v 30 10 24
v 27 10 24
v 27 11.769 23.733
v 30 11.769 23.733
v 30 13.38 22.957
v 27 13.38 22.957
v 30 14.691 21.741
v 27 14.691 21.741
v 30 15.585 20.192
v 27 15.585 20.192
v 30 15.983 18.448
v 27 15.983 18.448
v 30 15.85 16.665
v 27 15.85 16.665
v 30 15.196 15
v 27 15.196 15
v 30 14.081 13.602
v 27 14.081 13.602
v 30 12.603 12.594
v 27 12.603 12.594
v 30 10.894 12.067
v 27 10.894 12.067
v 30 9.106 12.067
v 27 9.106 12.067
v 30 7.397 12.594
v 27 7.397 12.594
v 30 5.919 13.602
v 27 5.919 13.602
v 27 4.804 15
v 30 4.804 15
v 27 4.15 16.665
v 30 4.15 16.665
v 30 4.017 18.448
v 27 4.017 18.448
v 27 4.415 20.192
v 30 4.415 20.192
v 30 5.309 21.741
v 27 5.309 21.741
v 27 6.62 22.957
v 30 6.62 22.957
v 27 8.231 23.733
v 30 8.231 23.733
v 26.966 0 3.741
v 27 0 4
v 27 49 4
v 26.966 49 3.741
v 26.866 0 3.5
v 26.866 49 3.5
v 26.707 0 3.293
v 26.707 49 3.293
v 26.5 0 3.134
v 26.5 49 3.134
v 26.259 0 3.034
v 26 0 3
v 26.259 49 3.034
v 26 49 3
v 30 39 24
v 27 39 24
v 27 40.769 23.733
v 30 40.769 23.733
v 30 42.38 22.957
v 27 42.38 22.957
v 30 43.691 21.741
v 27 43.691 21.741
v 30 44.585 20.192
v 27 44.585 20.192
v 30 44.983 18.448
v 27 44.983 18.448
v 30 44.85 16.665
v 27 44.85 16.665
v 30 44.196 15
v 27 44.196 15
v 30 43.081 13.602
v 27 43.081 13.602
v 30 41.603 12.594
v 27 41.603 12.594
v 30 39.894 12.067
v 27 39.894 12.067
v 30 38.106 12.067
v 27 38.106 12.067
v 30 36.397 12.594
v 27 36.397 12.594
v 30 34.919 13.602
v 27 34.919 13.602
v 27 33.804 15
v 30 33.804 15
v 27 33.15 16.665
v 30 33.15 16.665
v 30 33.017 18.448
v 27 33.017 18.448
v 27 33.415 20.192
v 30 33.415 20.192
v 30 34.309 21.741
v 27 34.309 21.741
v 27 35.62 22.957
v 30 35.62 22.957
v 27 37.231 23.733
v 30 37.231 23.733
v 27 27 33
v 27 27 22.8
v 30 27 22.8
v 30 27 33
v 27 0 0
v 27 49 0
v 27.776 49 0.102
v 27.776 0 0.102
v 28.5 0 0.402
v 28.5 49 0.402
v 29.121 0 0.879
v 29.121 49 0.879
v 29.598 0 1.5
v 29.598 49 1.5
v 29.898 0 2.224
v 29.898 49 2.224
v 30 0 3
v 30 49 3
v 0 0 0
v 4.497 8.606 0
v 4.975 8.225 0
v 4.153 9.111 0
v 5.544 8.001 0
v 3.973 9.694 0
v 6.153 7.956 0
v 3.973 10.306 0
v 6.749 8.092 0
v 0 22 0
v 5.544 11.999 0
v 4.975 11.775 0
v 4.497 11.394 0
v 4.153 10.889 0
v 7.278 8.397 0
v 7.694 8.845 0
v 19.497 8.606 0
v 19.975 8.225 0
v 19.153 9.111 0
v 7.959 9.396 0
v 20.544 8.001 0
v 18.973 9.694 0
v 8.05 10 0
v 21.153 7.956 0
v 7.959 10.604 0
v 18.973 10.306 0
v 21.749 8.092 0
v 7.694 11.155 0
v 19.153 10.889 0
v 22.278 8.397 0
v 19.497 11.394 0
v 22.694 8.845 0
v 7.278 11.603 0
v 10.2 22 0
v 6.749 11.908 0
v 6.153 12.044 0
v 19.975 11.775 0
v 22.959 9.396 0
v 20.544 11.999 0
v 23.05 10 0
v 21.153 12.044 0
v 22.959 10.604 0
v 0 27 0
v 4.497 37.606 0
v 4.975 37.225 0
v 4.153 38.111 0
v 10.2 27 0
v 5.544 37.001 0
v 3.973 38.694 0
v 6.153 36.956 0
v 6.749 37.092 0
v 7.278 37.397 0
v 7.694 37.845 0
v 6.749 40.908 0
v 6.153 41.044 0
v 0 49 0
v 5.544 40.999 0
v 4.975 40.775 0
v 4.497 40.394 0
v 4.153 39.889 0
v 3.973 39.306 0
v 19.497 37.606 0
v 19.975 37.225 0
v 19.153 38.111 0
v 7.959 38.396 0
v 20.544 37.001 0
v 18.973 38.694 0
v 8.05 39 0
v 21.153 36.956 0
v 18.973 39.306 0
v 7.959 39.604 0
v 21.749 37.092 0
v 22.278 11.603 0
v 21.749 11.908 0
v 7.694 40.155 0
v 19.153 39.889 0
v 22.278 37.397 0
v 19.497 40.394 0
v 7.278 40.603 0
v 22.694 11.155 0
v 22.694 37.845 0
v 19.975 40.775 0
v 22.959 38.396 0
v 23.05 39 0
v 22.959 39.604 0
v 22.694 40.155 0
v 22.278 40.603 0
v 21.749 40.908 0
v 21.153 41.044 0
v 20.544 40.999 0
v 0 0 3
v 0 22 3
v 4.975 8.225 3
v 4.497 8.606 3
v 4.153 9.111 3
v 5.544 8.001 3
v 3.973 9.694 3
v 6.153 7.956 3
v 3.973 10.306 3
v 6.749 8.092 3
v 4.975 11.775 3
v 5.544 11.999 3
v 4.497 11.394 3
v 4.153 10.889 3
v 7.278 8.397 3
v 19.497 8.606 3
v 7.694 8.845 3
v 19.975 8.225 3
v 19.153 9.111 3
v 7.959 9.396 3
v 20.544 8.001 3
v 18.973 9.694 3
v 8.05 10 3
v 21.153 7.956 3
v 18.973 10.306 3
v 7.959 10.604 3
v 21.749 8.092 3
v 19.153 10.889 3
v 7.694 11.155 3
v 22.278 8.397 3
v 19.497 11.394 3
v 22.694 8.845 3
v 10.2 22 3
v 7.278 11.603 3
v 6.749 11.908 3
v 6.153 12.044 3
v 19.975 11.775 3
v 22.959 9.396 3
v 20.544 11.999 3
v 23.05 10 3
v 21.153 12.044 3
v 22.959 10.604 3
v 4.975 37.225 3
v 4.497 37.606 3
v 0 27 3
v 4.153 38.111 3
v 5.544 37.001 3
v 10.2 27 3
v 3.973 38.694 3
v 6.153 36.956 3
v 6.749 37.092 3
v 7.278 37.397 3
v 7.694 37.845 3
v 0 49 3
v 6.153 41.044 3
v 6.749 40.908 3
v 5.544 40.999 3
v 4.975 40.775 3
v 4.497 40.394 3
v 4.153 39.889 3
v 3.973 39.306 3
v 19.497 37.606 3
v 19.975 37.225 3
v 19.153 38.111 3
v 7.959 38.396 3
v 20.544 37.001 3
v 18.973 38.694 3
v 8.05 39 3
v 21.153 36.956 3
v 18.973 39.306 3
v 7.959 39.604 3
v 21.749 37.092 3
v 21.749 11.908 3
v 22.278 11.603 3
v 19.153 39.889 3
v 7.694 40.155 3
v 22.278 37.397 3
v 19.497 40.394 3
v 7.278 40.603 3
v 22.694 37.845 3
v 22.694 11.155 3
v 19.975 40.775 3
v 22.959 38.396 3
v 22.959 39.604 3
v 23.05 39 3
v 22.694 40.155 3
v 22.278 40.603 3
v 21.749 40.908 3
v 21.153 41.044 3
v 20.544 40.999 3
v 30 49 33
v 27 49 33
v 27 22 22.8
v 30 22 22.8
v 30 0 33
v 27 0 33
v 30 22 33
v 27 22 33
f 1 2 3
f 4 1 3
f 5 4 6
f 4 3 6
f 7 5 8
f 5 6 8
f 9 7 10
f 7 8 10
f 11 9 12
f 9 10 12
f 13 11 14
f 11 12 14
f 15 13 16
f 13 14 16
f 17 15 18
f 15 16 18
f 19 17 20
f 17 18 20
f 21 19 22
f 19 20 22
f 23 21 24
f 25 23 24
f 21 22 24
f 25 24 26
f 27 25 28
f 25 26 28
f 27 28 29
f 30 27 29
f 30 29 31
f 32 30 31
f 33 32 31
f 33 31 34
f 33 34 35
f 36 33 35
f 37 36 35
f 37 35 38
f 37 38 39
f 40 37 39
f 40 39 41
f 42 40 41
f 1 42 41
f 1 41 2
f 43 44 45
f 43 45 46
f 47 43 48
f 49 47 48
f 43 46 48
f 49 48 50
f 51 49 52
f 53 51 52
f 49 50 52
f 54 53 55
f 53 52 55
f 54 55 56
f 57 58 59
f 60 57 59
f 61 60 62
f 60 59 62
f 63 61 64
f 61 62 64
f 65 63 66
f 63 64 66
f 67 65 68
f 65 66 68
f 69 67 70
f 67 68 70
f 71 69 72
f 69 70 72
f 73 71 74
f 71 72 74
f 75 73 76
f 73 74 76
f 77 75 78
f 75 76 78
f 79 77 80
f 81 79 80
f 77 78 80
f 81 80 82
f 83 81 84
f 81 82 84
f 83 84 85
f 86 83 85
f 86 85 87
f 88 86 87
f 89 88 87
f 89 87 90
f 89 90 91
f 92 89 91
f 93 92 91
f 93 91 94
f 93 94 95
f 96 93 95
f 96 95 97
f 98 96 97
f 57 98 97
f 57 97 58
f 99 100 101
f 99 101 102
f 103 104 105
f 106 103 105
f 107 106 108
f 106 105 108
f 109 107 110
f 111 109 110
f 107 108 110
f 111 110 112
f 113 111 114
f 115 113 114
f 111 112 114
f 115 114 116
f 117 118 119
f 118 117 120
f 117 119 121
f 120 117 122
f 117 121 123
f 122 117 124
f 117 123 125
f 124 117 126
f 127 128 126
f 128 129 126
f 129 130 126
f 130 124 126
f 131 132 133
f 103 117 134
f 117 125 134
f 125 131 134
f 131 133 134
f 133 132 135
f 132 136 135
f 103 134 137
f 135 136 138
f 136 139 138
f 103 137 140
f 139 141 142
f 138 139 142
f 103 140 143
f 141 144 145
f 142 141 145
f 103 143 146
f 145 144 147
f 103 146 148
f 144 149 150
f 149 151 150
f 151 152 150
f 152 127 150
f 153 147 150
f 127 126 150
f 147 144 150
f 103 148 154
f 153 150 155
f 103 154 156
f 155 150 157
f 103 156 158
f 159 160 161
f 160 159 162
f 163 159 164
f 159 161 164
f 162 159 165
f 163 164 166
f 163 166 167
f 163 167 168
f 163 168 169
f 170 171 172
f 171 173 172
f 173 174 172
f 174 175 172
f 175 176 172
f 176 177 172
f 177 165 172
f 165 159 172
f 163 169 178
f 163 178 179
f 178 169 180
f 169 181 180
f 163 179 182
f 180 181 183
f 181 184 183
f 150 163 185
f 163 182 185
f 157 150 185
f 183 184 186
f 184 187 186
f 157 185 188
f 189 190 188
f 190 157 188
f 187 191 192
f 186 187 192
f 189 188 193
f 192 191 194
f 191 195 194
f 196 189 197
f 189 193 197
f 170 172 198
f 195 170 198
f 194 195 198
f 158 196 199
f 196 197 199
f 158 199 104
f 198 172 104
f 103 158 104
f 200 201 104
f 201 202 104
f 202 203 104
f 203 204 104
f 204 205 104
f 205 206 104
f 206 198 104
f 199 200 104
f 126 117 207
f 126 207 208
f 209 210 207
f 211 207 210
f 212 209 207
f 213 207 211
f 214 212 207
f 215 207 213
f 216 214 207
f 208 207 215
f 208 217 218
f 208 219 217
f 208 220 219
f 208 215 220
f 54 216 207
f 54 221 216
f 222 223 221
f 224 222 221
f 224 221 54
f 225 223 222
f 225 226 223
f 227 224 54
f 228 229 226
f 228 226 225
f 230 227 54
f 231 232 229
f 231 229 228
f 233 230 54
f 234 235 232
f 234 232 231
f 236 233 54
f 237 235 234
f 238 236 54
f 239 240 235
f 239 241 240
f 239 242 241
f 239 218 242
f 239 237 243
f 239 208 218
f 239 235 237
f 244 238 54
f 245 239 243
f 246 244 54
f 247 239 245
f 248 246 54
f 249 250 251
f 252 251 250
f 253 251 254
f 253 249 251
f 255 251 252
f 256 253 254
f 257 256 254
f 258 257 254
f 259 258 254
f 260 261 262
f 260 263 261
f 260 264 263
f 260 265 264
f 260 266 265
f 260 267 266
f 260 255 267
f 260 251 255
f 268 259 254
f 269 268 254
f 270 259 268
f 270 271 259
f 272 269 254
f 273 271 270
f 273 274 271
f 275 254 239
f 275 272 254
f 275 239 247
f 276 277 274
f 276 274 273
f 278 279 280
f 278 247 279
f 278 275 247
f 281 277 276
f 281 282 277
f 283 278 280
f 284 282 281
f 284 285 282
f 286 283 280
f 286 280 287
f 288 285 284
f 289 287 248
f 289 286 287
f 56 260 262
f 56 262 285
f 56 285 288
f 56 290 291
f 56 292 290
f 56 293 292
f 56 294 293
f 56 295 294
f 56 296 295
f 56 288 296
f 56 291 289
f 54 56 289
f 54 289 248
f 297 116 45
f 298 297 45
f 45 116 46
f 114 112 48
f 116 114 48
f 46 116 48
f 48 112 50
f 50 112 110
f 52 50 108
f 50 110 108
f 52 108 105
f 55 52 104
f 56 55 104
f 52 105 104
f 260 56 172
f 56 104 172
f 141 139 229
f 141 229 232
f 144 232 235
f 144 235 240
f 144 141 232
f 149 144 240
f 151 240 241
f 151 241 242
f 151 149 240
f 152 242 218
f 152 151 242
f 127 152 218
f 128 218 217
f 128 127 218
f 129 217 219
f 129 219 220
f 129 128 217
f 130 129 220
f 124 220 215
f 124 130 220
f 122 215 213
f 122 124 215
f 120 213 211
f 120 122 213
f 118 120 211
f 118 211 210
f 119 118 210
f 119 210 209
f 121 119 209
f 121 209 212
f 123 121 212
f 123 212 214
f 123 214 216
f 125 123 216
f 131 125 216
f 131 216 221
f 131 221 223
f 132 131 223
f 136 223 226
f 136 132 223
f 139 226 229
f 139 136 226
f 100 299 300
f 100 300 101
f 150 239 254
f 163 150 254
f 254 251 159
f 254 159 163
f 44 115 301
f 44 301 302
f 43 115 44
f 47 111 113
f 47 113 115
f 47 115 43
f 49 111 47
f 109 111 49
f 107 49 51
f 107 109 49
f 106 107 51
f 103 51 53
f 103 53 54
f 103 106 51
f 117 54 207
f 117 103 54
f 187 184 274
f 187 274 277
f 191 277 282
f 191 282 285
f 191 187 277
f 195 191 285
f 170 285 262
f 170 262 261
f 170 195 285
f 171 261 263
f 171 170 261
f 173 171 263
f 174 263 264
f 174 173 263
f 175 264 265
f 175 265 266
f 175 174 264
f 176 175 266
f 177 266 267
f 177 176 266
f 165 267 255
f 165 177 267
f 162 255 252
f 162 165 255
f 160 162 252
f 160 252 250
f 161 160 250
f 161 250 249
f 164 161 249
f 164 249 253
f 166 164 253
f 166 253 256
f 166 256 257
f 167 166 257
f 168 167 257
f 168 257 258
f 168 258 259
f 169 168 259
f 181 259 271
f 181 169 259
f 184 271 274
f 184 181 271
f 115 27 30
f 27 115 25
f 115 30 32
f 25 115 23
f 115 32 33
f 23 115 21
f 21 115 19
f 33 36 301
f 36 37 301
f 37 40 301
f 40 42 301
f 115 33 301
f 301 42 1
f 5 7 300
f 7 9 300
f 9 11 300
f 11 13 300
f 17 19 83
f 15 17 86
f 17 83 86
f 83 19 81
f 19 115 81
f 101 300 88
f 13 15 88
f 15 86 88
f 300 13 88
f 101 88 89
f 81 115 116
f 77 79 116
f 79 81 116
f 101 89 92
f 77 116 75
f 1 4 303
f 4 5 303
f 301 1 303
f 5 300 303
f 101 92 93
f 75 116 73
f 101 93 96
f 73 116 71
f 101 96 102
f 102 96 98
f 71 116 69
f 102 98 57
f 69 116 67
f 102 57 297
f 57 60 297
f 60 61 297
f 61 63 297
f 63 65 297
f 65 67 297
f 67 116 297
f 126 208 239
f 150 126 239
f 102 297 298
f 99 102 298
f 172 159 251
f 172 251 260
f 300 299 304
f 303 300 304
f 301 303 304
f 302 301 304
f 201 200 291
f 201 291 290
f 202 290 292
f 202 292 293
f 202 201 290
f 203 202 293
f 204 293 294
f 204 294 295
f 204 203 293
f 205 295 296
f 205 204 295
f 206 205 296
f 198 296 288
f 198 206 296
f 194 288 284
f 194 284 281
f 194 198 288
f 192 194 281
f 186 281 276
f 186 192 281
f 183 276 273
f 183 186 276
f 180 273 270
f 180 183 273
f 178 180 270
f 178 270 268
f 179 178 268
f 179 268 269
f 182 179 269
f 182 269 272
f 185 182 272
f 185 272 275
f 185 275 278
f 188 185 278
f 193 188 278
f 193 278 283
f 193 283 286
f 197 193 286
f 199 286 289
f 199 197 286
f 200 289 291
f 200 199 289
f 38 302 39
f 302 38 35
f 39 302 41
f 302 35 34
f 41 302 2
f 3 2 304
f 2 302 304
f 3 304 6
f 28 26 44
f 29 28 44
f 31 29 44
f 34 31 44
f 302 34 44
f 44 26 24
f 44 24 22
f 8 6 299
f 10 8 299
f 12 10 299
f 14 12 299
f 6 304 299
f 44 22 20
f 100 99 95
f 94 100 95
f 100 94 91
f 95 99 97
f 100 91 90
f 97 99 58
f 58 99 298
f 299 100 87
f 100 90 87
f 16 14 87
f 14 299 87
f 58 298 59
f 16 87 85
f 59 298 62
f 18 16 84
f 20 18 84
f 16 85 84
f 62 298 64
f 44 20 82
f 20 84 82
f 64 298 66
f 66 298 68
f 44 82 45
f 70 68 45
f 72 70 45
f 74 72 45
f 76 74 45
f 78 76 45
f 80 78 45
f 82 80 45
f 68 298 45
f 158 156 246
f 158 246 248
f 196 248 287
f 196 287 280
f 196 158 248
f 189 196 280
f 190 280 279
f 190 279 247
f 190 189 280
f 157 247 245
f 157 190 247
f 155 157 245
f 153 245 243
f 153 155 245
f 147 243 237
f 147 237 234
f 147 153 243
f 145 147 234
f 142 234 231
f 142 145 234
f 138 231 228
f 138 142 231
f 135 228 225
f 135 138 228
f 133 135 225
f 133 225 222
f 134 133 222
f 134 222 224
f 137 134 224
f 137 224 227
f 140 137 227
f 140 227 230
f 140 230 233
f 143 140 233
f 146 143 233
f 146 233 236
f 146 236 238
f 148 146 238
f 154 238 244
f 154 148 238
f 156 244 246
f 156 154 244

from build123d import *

# Parameters (mm, degrees)
SKETCH2_W               = 27
SKETCH2_H               = 49
SKETCH2_R               = 2.05
BOSS_EXTRUDE1_DEPTH     = 3
BOSS_EXTRUDE2_DEPTH     = 49
SKETCH5_R               = 6
CUT_EXTRUDE1_DEPTH      = 4
FILLET1_R               = 1
SKETCH6_W               = 13.2
SKETCH6_H               = 5
CUT_EXTRUDE2_DEPTH      = 4
SKETCH7_W               = 10.2
SKETCH7_H               = 5
CUT_EXTRUDE3_DEPTH      = 28
CUT_EXTRUDE3_DEPTH_BACK = 4


with BuildPart() as part:
    # Sketch2 → Boss-Extrude1 (new body)
    with BuildSketch(Plane.XY):
        with Locations((13.5, 24.5)):
            Rectangle(SKETCH2_W, SKETCH2_H)
        with Locations((6, 39)):
            Circle(SKETCH2_R, mode=Mode.SUBTRACT)
        with Locations((21, 39)):
            Circle(SKETCH2_R, mode=Mode.SUBTRACT)
        with Locations((6, 10)):
            Circle(SKETCH2_R, mode=Mode.SUBTRACT)
        with Locations((21, 10)):
            Circle(SKETCH2_R, mode=Mode.SUBTRACT)
    extrude(amount=BOSS_EXTRUDE1_DEPTH)

    # Sketch4 → Boss-Extrude2 (add)
    with BuildSketch(Plane(origin=(0, 49, 0), x_dir=(1, 0, 0), z_dir=(0, 1, 0))):
        with BuildLine():
            Line((30, -3), (30, -33))
            Line((30, -33), (27, -33))
            Line((27, -33), (27, 0))
            ThreePointArc((27, 0), (29.121320344, -0.878679656), (30, -3))
        make_face()
    extrude(amount=-BOSS_EXTRUDE2_DEPTH)

    # Sketch5 → Cut-Extrude1 (cut, through all)
    with BuildSketch(Plane.ZY.offset(-27)):
        with Locations((18, 39)):
            Circle(SKETCH5_R)
        with Locations((18, 10)):
            Circle(SKETCH5_R)
    extrude(amount=-CUT_EXTRUDE1_DEPTH, mode=Mode.SUBTRACT)

    # Fillet1
    fillet1_edges = [part.edges().sort_by_distance(p)[0] for p in [
        (27, 24.5, 3),
    ]]
    fillet(fillet1_edges, radius=FILLET1_R)

    # Sketch6 → Cut-Extrude2 (cut, through all)
    with BuildSketch(Plane.XY.offset(3)):
        with Locations((3.6, 24.5)):
            Rectangle(SKETCH6_W, SKETCH6_H)
    extrude(amount=-CUT_EXTRUDE2_DEPTH, mode=Mode.SUBTRACT)

    # Sketch7 → Cut-Extrude3 (cut, two sides)
    with BuildSketch(Plane.ZY.offset(-27)) as cut_extrude3_sk:
        with Locations((27.9, 24.5)):
            Rectangle(SKETCH7_W, SKETCH7_H)
    extrude(amount=CUT_EXTRUDE3_DEPTH, mode=Mode.SUBTRACT)
    extrude(cut_extrude3_sk.sketch, amount=-CUT_EXTRUDE3_DEPTH_BACK, mode=Mode.SUBTRACT)


solid = part.part
